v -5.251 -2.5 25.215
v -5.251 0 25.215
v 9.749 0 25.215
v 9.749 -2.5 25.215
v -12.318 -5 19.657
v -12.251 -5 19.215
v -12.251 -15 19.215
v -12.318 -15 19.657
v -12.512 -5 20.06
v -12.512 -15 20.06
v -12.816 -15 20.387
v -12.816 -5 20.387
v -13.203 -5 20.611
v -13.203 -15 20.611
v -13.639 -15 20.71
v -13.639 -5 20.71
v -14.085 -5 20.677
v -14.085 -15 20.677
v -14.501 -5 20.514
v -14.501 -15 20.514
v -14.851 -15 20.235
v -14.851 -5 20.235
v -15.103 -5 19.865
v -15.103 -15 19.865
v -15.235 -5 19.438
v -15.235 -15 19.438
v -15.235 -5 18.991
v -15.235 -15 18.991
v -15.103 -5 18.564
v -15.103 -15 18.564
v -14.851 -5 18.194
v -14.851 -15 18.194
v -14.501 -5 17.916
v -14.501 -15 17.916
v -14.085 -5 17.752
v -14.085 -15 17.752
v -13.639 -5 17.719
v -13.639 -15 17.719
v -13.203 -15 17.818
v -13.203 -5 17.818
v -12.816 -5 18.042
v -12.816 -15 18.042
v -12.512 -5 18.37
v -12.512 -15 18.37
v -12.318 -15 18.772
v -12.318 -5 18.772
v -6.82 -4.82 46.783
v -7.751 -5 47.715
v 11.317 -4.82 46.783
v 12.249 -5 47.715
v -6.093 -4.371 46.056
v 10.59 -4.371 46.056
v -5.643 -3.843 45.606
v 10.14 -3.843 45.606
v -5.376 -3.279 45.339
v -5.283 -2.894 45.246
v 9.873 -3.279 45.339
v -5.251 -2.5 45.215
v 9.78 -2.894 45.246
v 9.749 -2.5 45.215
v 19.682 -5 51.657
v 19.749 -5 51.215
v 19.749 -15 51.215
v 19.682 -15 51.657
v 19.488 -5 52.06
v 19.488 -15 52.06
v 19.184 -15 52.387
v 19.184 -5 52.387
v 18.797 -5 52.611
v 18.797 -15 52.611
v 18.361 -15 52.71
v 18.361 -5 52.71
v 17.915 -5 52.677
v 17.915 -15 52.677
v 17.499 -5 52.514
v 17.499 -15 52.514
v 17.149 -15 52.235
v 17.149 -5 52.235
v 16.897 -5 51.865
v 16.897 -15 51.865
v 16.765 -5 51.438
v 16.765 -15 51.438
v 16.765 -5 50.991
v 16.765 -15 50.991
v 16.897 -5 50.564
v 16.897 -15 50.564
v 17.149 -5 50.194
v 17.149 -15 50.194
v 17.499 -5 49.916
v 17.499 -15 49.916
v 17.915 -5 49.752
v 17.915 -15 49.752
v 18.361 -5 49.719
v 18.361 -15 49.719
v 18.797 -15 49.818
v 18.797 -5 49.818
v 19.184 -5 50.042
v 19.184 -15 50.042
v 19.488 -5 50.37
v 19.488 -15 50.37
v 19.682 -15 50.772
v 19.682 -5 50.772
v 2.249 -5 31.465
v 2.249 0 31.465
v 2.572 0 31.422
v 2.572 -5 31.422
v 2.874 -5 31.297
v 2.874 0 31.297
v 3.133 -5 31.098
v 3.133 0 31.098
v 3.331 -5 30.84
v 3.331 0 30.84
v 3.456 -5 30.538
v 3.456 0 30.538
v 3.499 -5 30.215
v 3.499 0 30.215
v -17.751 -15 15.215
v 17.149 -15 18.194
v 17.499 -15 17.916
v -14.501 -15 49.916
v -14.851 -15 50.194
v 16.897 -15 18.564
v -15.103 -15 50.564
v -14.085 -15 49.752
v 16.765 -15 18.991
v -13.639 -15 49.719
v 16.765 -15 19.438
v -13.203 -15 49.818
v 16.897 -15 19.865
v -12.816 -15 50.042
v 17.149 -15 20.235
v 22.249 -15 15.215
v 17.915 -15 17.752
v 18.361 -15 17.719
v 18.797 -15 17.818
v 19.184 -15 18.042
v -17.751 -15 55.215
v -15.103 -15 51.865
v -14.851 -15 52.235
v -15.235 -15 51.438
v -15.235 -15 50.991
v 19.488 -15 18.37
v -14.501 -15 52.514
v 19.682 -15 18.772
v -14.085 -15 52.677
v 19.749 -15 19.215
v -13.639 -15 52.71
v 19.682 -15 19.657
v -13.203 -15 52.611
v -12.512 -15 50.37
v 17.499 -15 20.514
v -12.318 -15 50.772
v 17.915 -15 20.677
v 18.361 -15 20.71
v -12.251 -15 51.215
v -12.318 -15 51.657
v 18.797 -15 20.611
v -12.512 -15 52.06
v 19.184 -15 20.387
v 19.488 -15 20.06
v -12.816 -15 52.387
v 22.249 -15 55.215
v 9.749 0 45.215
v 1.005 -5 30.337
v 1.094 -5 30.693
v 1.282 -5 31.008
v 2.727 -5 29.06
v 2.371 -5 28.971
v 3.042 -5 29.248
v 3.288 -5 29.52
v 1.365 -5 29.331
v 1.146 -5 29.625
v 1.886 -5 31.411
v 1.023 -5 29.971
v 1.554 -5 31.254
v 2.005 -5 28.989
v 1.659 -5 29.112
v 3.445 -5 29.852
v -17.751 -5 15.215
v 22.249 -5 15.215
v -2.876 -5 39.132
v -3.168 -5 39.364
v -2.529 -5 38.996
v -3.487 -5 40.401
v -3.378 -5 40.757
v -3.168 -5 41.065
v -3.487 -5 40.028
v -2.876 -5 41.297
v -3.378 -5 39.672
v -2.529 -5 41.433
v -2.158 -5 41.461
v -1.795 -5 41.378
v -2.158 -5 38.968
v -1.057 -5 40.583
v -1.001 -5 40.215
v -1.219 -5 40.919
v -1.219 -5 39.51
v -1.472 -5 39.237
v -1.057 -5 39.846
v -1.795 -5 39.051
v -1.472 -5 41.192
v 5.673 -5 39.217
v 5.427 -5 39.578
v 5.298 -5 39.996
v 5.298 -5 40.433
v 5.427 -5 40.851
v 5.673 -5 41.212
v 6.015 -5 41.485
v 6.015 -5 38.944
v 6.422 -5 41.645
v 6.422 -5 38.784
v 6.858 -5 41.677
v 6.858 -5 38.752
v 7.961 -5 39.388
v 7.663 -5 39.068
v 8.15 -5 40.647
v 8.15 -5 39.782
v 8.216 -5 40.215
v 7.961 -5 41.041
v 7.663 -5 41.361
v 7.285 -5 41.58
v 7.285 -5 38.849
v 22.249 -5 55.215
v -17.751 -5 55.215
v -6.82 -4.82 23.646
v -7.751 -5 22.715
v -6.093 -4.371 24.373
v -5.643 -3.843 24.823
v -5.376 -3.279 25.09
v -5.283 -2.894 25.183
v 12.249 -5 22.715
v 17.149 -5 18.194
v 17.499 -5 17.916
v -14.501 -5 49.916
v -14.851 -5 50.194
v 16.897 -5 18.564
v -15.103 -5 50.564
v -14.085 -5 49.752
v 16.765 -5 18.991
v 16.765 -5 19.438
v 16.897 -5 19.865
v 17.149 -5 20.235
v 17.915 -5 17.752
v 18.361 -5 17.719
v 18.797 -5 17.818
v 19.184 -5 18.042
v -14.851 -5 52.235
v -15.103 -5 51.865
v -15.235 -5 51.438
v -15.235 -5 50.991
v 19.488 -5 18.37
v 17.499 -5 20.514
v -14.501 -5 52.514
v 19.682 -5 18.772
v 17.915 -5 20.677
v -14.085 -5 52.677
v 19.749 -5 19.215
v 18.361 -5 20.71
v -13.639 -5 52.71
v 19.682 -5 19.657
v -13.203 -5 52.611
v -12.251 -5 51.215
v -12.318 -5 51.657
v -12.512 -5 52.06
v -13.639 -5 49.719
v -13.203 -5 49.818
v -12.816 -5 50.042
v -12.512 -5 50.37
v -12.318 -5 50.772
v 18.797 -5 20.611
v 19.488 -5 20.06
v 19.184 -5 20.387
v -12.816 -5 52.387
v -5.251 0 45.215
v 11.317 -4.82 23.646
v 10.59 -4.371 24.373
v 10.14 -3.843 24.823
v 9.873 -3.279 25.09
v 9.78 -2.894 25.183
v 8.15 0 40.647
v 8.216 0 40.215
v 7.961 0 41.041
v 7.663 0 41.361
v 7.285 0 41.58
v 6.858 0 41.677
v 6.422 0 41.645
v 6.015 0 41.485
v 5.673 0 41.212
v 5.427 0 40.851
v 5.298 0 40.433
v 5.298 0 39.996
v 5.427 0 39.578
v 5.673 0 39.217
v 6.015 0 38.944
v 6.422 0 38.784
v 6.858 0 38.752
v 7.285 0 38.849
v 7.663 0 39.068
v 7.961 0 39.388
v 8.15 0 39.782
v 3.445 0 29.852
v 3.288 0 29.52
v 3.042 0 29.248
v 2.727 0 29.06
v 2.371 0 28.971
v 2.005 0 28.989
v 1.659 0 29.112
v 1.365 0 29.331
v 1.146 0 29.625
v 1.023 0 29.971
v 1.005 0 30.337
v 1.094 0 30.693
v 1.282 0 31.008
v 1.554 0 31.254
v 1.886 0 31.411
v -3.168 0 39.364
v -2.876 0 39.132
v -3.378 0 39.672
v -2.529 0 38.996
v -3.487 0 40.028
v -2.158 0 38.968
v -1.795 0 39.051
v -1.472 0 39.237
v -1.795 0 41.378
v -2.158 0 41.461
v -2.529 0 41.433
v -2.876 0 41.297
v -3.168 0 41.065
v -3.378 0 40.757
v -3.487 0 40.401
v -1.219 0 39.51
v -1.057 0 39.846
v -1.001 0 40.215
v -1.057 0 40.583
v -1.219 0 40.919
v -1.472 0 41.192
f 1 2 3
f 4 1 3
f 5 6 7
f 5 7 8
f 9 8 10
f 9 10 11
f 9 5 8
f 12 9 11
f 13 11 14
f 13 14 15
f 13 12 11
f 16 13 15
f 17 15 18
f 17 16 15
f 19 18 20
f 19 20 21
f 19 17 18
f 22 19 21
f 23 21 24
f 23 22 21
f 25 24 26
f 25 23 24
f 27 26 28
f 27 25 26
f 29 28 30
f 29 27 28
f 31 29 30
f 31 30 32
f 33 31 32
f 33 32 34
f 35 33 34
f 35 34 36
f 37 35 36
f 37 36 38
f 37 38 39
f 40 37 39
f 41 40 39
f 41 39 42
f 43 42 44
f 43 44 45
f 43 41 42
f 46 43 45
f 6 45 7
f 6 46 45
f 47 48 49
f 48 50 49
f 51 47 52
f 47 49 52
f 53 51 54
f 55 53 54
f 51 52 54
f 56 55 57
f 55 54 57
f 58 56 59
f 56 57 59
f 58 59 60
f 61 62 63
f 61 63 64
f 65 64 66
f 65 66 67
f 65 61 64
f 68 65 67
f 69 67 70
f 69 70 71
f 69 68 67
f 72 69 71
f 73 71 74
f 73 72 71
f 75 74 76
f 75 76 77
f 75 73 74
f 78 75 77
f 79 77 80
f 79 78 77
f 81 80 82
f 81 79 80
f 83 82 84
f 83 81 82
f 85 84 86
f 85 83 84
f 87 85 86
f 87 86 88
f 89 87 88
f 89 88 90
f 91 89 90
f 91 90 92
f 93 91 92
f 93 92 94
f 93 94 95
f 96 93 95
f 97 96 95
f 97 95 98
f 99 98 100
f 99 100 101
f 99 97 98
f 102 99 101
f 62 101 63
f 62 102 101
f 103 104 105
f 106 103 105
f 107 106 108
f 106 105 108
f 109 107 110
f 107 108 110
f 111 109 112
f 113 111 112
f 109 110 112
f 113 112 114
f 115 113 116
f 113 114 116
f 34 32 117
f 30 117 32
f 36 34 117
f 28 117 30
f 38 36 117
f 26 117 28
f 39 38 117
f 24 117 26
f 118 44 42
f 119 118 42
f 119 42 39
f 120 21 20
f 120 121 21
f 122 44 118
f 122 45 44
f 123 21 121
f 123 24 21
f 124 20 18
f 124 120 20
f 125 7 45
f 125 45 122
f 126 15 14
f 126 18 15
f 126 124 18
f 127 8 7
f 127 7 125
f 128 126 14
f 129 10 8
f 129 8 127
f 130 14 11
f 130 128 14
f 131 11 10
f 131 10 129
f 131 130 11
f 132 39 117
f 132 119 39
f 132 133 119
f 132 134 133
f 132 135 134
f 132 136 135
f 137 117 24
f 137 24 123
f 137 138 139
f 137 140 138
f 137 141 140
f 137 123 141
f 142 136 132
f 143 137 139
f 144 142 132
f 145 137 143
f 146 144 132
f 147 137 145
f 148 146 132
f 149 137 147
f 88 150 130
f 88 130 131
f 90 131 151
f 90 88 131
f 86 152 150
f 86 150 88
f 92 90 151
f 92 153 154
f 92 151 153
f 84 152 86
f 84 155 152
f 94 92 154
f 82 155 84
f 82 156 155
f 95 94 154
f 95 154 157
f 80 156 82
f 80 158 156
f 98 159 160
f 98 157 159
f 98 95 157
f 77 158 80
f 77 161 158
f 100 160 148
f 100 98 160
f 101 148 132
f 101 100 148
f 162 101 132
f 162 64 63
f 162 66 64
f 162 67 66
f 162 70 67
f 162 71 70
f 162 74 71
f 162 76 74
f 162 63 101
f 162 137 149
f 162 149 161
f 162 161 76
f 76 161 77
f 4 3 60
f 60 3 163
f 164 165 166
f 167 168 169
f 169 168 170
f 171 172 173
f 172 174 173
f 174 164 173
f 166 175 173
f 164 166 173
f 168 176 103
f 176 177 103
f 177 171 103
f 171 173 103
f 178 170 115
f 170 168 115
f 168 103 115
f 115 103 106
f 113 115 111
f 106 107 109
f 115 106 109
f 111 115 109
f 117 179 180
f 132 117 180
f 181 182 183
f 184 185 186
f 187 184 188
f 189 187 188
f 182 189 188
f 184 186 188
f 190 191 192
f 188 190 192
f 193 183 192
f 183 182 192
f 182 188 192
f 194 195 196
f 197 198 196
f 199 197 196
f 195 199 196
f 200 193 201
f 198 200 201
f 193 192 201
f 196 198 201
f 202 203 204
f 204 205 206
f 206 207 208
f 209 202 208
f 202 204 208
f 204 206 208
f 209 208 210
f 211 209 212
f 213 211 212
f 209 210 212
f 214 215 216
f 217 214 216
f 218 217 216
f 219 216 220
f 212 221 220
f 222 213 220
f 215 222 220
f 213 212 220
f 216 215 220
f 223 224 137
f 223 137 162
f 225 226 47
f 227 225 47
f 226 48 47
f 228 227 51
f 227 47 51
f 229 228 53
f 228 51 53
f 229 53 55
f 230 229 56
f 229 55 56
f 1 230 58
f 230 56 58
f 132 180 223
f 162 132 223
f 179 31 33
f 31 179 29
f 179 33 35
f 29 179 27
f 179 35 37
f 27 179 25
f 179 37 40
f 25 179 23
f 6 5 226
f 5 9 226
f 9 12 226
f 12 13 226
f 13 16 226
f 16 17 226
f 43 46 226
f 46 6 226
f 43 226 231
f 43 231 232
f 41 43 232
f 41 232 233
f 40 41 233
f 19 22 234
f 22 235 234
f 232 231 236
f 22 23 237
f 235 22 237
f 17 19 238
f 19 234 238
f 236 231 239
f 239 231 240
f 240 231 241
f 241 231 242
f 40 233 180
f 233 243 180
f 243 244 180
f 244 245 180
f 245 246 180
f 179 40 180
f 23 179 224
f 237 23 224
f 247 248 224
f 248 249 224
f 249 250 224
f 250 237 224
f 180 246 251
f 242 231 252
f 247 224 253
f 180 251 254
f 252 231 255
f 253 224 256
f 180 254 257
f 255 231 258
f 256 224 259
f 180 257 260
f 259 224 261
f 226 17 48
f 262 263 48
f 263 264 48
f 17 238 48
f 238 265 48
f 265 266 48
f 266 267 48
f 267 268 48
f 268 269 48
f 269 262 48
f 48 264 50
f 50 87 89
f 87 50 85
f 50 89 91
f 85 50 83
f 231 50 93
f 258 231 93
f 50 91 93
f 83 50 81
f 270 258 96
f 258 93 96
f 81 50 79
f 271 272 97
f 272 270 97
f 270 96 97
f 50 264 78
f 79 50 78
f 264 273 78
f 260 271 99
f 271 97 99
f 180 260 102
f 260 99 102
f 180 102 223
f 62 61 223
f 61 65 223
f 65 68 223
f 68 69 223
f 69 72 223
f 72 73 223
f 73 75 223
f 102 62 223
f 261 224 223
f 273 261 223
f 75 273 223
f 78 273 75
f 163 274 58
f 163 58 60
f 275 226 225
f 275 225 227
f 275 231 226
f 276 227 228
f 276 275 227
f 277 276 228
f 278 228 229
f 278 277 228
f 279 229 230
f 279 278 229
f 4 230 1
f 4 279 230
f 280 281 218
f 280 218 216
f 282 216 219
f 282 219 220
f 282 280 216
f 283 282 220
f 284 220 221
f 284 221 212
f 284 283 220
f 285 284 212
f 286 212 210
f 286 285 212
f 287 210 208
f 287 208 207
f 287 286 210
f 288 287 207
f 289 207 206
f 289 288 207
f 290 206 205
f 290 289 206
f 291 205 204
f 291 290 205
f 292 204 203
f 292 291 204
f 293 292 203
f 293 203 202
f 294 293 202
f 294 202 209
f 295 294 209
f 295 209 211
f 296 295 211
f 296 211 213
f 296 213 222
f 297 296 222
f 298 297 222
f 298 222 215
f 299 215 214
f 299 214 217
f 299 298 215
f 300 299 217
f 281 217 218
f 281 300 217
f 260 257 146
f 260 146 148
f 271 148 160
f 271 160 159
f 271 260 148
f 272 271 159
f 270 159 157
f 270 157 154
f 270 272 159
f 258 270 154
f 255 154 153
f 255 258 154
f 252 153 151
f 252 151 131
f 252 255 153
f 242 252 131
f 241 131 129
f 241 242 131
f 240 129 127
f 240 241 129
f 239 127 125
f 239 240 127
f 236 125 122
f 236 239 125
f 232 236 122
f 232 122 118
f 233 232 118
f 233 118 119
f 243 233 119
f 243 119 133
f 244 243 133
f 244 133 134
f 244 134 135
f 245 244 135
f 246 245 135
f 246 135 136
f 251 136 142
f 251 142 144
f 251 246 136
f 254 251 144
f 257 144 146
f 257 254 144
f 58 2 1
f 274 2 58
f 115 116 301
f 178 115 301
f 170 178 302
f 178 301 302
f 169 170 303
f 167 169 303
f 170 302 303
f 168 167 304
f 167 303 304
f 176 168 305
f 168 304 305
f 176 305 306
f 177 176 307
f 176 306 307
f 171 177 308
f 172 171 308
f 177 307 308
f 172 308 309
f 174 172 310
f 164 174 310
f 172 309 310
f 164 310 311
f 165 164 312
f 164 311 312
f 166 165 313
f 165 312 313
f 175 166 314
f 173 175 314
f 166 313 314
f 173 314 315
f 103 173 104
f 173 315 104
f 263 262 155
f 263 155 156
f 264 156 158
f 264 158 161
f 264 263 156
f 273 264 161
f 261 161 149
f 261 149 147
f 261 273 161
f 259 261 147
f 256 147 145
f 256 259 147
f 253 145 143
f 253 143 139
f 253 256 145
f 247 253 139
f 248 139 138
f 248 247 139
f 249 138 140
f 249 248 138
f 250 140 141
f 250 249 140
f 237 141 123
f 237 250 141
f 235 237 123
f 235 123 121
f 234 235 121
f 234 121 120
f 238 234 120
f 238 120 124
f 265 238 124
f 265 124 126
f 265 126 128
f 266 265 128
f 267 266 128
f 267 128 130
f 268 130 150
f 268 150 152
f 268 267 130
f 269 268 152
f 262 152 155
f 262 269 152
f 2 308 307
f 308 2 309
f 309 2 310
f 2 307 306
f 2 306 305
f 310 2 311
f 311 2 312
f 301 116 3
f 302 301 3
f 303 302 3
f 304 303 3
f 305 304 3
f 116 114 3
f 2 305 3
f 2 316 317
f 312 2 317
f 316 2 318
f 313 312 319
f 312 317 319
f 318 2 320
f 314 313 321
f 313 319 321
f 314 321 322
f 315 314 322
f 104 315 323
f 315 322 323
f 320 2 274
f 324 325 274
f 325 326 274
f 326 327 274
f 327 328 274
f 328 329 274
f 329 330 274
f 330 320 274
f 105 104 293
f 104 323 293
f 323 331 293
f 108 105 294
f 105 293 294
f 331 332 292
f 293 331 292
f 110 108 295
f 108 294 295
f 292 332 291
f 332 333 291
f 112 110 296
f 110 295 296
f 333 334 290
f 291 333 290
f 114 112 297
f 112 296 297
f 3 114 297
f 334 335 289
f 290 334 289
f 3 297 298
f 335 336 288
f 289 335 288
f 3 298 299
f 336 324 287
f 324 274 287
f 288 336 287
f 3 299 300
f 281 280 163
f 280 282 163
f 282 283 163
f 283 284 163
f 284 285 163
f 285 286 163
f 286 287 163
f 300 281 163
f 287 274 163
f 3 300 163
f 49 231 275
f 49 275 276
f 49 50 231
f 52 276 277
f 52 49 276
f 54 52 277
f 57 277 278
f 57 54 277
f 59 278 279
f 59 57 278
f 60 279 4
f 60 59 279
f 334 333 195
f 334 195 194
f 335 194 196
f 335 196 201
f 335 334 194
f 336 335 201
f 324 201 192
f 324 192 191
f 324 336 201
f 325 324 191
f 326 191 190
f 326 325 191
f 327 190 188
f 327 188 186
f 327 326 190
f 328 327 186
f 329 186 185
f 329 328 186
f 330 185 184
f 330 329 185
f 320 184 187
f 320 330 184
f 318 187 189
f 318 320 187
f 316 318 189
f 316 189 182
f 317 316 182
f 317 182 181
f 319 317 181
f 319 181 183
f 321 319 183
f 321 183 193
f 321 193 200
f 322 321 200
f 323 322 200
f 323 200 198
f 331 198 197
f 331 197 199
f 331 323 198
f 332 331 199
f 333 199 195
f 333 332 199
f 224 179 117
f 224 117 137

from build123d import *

# Parameters (mm, degrees)
F0_W     = 15
F0_H     = 20
F0_R     = 1.25
F0_R_2   = 1.4668994292
F1_DEPTH = 5
F2_W     = 40
F2_H     = 40
F2_R     = 1.5
F2_W_2   = 15
F2_H_2   = 20
F2_R_2   = 1.25
F3_DEPTH = 10
F4_R     = 2.5


with BuildPart() as f1:
    # F0 (on Front) → F1 (new body)
    with BuildSketch(Plane.XZ):
        with Locations((2.2486895237, 35.21458745)):
            Rectangle(F0_W, F0_H)
        with BuildLine():
            ThreePointArc((2.2486895237, 31.46458745), (3.1325730002, 31.0984709265), (3.4986895237, 30.21458745))
            ThreePointArc((3.4986895237, 30.21458745), (1.3648060472, 29.3307039735), (2.2486895237, 31.46458745))
        make_face(mode=Mode.SUBTRACT)
        with Locations((-2.2513104763, 40.21458745)):
            Circle(F0_R, mode=Mode.SUBTRACT)
        with Locations((6.7486895237, 40.21458745)):
            Circle(F0_R_2, mode=Mode.SUBTRACT)
    extrude(amount=F1_DEPTH)

    # F2 (on face) → F3 (join)
    with BuildSketch(Plane.XZ.offset(5)):
        with Locations((2.2486895237, 35.21458745)):
            Rectangle(F2_W, F2_H)
        with Locations((-13.7513104763, 19.21458745)):
            Circle(F2_R, mode=Mode.SUBTRACT)
        with Locations((2.2486895237, 35.21458745)):
            Rectangle(F2_W_2, F2_H_2, mode=Mode.SUBTRACT)
        with Locations((18.2486895237, 19.21458745)):
            Circle(F2_R, mode=Mode.SUBTRACT)
        with Locations((-13.7513104763, 51.21458745)):
            Circle(F2_R, mode=Mode.SUBTRACT)
        with Locations((18.2486895237, 51.21458745)):
            Circle(F2_R, mode=Mode.SUBTRACT)
        with BuildLine():
            Line((9.7486895237, 25.21458745), (9.7486895237, 45.21458745))
            Line((9.7486895237, 45.21458745), (7.0718369676, 41.6454507086))
            ThreePointArc((7.0718369676, 41.6454507086), (7.8945120964, 41.1304938683), (8.2155889529, 40.21458745))
            ThreePointArc((8.2155889529, 40.21458745), (7.1158037309, 38.7943687717), (5.4655420798, 39.5037241914))
            Line((5.4655420798, 39.5037241914), (-5.2513104763, 25.21458745))
            Line((-5.2513104763, 25.21458745), (9.7486895237, 25.21458745))
        make_face()
        with Locations((2.2486895237, 30.21458745)):
            Circle(F2_R_2, mode=Mode.SUBTRACT)
        with BuildLine():
            Line((7.0718369676, 41.6454507086), (9.7486895237, 45.21458745))
            Line((9.7486895237, 45.21458745), (-5.2513104763, 45.21458745))
            Line((-5.2513104763, 45.21458745), (-5.2513104763, 25.21458745))
            Line((-5.2513104763, 25.21458745), (5.4655420798, 39.5037241914))
            ThreePointArc((5.4655420798, 39.5037241914), (5.5751699804, 41.0947271075), (7.0718369676, 41.6454507086))
        make_face()
        with Locations((-2.2513104763, 40.21458745)):
            Circle(F2_R_2, mode=Mode.SUBTRACT)
        with BuildLine():
            ThreePointArc((8.2155889529, 40.21458745), (7.8945120964, 41.1304938683), (7.0718369676, 41.6454507086))
            Line((7.0718369676, 41.6454507086), (5.4655420798, 39.5037241914))
            ThreePointArc((5.4655420798, 39.5037241914), (7.1158037309, 38.7943687717), (8.2155889529, 40.21458745))
        make_face()
        with Locations((-2.2513104763, 40.21458745)):
            Circle(F2_R_2)
        with BuildLine():
            Line((5.4655420798, 39.5037241914), (7.0718369676, 41.6454507086))
            ThreePointArc((7.0718369676, 41.6454507086), (5.5751699804, 41.0947271075), (5.4655420798, 39.5037241914))
        make_face()
        with Locations((2.2486895237, 30.21458745)):
            Circle(F2_R_2)
    extrude(amount=F3_DEPTH)

    # F4
    f4_edges = [f1.edges().sort_by_distance(p)[0] for p in [
        (-5.25131, -5, 35.214587),
        (2.24869, -5, 25.214587),
        (9.74869, -5, 35.214587),
        (2.24869, -5, 45.214587),
    ]]
    fillet(f4_edges, radius=F4_R)


solid = f1.part
